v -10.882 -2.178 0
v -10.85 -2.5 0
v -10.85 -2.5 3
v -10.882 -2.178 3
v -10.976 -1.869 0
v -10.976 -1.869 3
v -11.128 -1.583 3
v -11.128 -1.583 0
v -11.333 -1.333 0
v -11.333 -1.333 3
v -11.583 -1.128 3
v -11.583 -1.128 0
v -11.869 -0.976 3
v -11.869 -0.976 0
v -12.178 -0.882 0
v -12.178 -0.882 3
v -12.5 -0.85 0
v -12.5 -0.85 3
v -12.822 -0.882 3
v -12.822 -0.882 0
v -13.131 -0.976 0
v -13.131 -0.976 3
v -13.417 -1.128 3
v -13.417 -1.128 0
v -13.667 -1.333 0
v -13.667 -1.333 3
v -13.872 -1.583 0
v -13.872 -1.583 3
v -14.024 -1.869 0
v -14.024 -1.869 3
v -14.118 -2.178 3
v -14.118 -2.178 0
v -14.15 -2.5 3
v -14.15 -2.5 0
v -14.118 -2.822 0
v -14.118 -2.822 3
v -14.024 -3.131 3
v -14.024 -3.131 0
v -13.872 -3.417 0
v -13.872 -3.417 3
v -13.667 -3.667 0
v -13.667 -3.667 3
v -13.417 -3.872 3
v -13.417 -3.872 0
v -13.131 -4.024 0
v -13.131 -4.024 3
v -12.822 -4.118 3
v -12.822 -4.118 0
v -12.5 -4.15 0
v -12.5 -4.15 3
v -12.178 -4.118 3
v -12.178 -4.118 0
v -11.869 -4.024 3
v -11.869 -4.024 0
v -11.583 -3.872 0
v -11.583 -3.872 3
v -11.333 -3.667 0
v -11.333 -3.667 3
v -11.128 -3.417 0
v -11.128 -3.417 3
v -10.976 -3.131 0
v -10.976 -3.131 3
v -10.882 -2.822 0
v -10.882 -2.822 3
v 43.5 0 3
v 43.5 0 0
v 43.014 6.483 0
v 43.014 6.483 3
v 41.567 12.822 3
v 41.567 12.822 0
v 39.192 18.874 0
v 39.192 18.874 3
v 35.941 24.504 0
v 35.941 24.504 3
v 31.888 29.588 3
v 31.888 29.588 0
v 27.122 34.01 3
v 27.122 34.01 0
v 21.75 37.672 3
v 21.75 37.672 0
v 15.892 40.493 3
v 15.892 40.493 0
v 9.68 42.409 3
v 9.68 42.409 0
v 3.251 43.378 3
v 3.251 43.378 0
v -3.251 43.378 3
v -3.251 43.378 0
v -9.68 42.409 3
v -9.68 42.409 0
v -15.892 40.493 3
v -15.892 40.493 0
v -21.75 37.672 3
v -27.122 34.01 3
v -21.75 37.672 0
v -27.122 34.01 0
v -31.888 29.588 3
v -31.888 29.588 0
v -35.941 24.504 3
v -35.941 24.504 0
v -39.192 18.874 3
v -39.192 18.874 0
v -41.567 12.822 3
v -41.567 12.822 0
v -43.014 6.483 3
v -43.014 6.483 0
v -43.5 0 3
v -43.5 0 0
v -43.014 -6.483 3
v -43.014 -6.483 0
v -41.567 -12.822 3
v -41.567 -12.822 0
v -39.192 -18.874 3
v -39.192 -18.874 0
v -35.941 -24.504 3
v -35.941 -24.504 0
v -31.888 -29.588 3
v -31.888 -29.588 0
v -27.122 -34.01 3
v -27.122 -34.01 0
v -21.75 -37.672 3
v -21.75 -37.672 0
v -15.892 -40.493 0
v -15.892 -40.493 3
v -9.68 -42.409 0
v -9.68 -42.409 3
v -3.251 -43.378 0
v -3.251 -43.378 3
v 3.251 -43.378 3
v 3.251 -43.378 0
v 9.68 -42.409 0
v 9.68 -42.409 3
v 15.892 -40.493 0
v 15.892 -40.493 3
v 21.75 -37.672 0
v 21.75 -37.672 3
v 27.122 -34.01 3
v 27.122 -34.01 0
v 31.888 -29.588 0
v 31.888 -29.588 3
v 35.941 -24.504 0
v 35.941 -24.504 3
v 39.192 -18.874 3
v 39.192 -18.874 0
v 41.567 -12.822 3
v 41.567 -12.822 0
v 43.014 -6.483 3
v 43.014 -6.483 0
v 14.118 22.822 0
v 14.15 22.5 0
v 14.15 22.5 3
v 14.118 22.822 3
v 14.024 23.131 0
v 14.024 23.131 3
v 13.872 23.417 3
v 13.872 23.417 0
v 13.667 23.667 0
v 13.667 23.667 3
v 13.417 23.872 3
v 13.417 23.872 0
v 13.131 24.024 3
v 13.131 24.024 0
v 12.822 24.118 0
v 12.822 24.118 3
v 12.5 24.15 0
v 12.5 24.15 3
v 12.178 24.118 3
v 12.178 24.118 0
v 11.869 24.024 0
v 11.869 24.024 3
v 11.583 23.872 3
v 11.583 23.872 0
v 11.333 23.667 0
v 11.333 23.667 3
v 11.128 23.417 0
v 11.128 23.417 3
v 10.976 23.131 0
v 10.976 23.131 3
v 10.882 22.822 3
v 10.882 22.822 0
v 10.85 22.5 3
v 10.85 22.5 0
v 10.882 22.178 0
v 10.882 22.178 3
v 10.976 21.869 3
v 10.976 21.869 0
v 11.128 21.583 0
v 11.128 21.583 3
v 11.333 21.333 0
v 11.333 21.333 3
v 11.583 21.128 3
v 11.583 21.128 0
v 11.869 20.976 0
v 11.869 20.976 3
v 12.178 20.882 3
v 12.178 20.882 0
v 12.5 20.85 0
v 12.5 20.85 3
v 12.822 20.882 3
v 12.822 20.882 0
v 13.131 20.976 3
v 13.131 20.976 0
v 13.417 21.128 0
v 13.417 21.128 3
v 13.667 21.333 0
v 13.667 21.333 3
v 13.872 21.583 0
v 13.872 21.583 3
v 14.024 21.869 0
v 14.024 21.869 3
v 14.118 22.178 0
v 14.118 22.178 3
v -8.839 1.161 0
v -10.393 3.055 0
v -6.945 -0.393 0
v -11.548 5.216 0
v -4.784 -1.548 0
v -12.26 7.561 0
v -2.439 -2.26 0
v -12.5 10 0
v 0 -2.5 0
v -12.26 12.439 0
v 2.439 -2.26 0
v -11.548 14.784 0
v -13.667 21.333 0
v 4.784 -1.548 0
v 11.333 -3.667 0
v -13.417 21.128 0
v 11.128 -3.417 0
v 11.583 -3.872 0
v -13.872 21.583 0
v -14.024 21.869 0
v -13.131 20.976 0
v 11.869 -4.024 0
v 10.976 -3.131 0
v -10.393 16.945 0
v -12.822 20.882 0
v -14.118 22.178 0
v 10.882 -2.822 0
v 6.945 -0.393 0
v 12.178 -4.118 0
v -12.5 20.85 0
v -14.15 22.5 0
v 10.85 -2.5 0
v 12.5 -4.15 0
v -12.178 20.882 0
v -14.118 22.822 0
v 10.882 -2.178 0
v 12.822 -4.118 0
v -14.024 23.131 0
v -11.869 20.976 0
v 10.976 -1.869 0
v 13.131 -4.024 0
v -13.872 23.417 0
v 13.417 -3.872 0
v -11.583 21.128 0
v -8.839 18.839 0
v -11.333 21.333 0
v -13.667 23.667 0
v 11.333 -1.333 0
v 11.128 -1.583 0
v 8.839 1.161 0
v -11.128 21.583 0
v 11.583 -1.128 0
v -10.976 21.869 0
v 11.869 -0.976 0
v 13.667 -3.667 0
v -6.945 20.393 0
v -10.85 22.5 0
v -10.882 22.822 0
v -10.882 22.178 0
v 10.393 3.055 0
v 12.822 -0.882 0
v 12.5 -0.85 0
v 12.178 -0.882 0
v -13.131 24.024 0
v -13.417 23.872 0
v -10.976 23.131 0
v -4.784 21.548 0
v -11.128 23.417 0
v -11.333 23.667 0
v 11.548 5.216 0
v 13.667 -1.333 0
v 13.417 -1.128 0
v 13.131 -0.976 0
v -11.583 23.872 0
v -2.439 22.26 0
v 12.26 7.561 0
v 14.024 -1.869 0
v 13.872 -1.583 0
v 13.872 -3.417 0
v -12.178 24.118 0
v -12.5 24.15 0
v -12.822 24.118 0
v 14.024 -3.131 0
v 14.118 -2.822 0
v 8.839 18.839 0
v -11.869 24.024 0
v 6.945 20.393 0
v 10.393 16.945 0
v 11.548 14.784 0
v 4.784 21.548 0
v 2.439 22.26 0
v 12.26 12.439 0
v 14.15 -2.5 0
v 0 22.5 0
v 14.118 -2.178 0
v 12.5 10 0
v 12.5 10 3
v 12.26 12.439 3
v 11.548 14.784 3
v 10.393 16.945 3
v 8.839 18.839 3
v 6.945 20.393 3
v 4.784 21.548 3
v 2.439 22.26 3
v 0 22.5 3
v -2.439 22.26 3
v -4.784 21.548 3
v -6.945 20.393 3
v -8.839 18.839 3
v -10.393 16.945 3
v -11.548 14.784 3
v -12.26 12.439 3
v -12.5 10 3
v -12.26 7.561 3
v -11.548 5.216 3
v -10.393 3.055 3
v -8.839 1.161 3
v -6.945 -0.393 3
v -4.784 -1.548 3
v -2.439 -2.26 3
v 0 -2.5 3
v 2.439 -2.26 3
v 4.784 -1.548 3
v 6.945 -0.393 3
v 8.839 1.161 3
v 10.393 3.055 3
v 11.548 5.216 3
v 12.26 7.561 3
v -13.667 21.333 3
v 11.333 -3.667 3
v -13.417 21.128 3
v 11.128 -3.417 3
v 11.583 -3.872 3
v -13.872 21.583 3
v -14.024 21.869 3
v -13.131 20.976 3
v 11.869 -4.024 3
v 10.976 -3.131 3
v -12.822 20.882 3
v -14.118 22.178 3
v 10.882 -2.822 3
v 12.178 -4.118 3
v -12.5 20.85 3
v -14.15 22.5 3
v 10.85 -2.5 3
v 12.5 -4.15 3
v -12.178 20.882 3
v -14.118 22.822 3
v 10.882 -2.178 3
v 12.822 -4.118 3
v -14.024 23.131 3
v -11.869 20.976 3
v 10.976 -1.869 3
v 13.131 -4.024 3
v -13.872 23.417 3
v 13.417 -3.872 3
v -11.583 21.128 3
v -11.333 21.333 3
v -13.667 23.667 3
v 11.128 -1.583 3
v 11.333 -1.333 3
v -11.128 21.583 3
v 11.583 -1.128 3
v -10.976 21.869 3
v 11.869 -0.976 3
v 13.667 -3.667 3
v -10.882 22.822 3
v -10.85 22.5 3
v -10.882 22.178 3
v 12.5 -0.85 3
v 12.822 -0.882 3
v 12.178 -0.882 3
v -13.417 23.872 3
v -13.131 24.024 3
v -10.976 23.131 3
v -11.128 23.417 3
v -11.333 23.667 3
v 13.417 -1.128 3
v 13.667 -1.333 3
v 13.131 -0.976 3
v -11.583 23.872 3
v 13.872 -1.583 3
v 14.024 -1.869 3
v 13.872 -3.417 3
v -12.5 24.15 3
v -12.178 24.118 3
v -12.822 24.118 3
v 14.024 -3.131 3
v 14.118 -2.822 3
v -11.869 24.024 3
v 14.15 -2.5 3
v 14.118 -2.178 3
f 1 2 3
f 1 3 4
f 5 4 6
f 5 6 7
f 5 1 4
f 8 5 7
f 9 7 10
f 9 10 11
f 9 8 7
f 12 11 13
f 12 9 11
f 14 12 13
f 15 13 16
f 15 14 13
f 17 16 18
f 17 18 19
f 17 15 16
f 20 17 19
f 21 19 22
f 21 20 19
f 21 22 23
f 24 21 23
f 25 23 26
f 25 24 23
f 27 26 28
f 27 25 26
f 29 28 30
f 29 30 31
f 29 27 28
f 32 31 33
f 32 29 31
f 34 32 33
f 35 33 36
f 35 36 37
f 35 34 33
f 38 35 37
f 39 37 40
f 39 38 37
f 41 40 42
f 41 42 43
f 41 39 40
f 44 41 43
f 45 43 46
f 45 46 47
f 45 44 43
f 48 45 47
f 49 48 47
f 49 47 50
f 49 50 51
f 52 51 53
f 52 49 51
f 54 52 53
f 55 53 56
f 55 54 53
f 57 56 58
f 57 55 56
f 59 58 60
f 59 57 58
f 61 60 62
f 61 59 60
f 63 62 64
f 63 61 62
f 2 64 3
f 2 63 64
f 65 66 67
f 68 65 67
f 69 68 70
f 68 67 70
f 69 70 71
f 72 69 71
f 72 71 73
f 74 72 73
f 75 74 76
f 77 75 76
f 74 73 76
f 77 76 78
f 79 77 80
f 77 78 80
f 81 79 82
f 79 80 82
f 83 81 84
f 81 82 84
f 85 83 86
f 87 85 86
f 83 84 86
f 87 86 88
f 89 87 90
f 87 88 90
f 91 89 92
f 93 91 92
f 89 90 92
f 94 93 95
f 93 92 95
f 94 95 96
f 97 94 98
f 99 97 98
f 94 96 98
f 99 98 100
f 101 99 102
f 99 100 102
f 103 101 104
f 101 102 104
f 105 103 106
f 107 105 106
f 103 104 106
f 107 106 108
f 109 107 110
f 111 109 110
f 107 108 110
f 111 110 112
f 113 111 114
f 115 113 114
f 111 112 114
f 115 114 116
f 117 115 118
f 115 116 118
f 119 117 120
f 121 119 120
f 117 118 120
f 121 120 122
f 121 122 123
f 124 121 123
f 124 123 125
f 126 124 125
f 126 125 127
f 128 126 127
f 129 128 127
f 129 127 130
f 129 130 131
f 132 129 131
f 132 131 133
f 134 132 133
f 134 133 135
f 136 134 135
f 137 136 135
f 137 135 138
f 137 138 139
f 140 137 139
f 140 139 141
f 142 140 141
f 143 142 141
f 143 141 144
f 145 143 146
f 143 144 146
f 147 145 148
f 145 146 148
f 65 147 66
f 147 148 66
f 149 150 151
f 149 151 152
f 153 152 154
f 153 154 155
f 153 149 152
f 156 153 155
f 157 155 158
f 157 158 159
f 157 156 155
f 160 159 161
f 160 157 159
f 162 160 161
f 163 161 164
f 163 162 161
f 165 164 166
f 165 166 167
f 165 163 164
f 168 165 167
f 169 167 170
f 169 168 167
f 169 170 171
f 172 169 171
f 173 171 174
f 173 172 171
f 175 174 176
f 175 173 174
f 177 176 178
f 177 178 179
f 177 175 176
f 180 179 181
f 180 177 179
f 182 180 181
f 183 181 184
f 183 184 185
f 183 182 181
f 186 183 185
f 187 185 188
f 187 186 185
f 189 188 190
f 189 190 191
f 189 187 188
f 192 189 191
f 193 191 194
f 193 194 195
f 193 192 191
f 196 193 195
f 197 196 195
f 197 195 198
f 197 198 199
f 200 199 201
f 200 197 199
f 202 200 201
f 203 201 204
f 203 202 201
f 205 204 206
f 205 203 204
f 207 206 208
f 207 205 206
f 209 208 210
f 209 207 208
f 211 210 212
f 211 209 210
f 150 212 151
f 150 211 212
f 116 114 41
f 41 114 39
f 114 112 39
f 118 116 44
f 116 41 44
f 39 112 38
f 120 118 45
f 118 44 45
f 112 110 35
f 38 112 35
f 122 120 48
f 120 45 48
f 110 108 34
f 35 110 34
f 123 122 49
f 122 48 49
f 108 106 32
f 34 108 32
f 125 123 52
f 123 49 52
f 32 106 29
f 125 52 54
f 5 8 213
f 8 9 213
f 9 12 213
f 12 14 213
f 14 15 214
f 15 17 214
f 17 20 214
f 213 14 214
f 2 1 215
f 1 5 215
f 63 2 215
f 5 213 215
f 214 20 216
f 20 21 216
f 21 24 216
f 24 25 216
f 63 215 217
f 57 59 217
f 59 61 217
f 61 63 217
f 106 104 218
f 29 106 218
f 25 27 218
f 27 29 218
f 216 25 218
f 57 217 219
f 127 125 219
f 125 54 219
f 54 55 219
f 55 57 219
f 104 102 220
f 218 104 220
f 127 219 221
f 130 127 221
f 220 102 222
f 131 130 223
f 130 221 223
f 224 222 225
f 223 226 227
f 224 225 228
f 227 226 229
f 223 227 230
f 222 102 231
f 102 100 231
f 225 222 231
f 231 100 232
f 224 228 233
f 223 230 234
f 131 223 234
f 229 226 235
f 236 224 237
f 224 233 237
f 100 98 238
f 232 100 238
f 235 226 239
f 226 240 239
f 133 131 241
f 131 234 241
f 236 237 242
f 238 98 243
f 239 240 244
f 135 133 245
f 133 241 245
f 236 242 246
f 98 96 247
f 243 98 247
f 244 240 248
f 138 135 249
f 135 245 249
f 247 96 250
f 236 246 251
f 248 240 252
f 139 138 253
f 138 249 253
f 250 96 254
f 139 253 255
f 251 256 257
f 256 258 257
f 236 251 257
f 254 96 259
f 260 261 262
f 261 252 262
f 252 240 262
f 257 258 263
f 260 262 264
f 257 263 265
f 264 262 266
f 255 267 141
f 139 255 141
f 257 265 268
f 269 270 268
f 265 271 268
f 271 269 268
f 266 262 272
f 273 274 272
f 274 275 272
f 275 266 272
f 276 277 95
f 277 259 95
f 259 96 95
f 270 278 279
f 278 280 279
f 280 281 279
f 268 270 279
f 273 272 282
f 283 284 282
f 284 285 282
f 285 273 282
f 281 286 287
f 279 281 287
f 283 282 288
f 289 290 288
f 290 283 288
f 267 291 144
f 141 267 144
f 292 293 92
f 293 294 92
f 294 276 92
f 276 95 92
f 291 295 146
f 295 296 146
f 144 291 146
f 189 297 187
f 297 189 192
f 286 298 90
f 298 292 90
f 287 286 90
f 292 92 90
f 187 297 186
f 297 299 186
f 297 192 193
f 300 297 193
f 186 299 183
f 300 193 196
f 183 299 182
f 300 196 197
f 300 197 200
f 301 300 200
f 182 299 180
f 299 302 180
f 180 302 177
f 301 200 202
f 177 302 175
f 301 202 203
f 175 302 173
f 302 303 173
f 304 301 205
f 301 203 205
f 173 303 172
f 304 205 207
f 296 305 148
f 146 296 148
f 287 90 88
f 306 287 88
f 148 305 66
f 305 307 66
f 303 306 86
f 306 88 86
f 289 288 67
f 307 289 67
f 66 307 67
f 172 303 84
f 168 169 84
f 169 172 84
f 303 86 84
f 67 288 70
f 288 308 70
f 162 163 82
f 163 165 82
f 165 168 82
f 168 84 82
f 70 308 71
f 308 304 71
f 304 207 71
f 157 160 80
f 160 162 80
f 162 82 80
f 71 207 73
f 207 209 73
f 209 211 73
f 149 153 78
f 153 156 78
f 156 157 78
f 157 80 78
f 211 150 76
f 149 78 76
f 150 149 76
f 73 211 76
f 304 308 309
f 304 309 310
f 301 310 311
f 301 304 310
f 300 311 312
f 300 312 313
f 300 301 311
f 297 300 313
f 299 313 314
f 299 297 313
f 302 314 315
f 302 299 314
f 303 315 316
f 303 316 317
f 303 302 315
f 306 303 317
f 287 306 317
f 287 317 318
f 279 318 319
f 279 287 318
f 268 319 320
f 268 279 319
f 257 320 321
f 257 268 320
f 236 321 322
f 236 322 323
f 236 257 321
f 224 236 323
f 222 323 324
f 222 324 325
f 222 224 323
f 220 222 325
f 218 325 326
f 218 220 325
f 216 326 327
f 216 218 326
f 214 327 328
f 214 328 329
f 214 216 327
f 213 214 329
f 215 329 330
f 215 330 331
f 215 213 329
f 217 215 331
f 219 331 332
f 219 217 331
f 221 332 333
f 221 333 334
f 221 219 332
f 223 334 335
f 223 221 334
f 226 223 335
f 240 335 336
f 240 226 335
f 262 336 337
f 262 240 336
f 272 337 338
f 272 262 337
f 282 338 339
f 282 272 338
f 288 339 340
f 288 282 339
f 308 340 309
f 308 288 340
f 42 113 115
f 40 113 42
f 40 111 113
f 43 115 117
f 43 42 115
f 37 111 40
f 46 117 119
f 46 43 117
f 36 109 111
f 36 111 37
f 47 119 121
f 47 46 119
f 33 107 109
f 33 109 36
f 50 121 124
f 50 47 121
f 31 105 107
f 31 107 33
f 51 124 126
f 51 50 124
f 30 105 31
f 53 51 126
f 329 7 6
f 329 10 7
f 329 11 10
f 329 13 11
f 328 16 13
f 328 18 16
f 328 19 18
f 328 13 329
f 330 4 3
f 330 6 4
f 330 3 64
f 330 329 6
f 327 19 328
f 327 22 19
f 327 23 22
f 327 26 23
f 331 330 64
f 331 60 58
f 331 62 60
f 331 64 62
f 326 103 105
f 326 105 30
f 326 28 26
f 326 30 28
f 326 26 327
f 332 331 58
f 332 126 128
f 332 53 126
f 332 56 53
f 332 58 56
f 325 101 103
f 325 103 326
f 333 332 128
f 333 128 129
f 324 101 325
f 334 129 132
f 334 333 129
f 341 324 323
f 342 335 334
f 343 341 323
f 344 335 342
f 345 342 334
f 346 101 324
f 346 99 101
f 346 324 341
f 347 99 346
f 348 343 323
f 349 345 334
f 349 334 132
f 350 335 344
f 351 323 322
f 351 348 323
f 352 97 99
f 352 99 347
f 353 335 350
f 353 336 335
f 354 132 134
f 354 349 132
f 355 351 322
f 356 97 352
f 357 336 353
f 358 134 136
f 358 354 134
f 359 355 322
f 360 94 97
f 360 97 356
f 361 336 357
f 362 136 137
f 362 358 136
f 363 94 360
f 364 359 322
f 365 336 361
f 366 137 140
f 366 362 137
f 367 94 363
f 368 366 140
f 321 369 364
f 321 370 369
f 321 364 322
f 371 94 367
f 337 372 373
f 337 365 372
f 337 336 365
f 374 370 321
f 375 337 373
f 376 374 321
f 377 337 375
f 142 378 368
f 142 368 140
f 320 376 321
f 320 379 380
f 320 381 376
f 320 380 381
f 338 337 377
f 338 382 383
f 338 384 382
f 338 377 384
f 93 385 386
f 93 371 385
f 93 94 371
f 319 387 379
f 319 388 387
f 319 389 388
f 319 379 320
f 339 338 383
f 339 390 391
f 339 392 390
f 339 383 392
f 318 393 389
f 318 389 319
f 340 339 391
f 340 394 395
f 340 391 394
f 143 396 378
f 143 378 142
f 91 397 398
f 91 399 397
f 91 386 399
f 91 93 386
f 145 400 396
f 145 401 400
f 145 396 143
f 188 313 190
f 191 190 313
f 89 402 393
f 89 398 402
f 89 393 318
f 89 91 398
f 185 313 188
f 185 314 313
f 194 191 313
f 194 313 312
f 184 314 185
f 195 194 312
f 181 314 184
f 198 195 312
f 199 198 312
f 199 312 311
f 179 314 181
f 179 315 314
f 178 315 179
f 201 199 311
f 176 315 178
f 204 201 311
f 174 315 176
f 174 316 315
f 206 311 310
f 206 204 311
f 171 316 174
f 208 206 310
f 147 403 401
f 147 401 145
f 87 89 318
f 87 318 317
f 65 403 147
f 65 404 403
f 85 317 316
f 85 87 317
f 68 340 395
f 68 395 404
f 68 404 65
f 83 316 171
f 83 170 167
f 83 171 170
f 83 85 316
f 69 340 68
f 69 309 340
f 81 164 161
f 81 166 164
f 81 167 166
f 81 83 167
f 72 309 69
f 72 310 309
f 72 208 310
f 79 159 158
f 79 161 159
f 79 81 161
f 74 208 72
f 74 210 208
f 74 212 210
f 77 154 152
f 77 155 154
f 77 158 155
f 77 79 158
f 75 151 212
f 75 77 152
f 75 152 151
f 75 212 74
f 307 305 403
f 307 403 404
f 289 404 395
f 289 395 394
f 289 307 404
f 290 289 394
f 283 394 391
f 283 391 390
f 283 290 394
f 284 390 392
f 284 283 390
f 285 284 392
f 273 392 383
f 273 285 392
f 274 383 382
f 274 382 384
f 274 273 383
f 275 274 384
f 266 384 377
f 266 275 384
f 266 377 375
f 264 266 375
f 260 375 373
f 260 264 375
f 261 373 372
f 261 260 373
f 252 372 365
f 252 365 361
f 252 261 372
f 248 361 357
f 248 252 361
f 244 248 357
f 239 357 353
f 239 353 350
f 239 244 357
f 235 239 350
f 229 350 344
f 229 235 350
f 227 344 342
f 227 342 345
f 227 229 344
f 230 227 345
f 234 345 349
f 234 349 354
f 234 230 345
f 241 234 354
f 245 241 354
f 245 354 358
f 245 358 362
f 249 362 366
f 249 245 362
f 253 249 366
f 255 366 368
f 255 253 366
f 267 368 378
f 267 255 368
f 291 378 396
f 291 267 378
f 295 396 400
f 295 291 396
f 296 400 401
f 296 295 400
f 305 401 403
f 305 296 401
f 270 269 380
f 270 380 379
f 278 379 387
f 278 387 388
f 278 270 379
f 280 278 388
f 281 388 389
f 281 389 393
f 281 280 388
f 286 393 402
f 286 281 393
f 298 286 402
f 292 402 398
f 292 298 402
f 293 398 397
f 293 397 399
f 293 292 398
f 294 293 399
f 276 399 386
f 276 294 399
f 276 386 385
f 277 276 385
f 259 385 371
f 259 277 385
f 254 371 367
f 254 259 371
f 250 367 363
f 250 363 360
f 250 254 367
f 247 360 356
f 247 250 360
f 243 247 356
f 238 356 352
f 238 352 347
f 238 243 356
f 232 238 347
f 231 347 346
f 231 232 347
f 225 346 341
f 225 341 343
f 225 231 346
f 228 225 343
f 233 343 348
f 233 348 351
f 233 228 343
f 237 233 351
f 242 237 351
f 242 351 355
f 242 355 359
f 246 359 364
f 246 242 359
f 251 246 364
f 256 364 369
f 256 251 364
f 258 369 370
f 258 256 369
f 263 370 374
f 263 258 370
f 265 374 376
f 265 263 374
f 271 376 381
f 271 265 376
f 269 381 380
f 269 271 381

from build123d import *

# Parameters (mm, degrees)
SKETCH1_R           = 43.5
SKETCH1_R_2         = 1.65
SKETCH1_R_3         = 12.5
BOSS_EXTRUDE1_DEPTH = 3


with BuildPart() as part:
    # Sketch1 → Boss-Extrude1 (new body)
    with BuildSketch(Plane.XY):
        Circle(SKETCH1_R)
        with Locations((-12.5, -2.5)):
            Circle(SKETCH1_R_2, mode=Mode.SUBTRACT)
        with Locations((12.5, -2.5)):
            Circle(SKETCH1_R_2, mode=Mode.SUBTRACT)
        with Locations((12.5, 22.5)):
            Circle(SKETCH1_R_2, mode=Mode.SUBTRACT)
        with Locations((-12.5, 22.5)):
            Circle(SKETCH1_R_2, mode=Mode.SUBTRACT)
        with Locations((0, 10)):
            Circle(SKETCH1_R_3, mode=Mode.SUBTRACT)
    extrude(amount=BOSS_EXTRUDE1_DEPTH)


solid = part.part
